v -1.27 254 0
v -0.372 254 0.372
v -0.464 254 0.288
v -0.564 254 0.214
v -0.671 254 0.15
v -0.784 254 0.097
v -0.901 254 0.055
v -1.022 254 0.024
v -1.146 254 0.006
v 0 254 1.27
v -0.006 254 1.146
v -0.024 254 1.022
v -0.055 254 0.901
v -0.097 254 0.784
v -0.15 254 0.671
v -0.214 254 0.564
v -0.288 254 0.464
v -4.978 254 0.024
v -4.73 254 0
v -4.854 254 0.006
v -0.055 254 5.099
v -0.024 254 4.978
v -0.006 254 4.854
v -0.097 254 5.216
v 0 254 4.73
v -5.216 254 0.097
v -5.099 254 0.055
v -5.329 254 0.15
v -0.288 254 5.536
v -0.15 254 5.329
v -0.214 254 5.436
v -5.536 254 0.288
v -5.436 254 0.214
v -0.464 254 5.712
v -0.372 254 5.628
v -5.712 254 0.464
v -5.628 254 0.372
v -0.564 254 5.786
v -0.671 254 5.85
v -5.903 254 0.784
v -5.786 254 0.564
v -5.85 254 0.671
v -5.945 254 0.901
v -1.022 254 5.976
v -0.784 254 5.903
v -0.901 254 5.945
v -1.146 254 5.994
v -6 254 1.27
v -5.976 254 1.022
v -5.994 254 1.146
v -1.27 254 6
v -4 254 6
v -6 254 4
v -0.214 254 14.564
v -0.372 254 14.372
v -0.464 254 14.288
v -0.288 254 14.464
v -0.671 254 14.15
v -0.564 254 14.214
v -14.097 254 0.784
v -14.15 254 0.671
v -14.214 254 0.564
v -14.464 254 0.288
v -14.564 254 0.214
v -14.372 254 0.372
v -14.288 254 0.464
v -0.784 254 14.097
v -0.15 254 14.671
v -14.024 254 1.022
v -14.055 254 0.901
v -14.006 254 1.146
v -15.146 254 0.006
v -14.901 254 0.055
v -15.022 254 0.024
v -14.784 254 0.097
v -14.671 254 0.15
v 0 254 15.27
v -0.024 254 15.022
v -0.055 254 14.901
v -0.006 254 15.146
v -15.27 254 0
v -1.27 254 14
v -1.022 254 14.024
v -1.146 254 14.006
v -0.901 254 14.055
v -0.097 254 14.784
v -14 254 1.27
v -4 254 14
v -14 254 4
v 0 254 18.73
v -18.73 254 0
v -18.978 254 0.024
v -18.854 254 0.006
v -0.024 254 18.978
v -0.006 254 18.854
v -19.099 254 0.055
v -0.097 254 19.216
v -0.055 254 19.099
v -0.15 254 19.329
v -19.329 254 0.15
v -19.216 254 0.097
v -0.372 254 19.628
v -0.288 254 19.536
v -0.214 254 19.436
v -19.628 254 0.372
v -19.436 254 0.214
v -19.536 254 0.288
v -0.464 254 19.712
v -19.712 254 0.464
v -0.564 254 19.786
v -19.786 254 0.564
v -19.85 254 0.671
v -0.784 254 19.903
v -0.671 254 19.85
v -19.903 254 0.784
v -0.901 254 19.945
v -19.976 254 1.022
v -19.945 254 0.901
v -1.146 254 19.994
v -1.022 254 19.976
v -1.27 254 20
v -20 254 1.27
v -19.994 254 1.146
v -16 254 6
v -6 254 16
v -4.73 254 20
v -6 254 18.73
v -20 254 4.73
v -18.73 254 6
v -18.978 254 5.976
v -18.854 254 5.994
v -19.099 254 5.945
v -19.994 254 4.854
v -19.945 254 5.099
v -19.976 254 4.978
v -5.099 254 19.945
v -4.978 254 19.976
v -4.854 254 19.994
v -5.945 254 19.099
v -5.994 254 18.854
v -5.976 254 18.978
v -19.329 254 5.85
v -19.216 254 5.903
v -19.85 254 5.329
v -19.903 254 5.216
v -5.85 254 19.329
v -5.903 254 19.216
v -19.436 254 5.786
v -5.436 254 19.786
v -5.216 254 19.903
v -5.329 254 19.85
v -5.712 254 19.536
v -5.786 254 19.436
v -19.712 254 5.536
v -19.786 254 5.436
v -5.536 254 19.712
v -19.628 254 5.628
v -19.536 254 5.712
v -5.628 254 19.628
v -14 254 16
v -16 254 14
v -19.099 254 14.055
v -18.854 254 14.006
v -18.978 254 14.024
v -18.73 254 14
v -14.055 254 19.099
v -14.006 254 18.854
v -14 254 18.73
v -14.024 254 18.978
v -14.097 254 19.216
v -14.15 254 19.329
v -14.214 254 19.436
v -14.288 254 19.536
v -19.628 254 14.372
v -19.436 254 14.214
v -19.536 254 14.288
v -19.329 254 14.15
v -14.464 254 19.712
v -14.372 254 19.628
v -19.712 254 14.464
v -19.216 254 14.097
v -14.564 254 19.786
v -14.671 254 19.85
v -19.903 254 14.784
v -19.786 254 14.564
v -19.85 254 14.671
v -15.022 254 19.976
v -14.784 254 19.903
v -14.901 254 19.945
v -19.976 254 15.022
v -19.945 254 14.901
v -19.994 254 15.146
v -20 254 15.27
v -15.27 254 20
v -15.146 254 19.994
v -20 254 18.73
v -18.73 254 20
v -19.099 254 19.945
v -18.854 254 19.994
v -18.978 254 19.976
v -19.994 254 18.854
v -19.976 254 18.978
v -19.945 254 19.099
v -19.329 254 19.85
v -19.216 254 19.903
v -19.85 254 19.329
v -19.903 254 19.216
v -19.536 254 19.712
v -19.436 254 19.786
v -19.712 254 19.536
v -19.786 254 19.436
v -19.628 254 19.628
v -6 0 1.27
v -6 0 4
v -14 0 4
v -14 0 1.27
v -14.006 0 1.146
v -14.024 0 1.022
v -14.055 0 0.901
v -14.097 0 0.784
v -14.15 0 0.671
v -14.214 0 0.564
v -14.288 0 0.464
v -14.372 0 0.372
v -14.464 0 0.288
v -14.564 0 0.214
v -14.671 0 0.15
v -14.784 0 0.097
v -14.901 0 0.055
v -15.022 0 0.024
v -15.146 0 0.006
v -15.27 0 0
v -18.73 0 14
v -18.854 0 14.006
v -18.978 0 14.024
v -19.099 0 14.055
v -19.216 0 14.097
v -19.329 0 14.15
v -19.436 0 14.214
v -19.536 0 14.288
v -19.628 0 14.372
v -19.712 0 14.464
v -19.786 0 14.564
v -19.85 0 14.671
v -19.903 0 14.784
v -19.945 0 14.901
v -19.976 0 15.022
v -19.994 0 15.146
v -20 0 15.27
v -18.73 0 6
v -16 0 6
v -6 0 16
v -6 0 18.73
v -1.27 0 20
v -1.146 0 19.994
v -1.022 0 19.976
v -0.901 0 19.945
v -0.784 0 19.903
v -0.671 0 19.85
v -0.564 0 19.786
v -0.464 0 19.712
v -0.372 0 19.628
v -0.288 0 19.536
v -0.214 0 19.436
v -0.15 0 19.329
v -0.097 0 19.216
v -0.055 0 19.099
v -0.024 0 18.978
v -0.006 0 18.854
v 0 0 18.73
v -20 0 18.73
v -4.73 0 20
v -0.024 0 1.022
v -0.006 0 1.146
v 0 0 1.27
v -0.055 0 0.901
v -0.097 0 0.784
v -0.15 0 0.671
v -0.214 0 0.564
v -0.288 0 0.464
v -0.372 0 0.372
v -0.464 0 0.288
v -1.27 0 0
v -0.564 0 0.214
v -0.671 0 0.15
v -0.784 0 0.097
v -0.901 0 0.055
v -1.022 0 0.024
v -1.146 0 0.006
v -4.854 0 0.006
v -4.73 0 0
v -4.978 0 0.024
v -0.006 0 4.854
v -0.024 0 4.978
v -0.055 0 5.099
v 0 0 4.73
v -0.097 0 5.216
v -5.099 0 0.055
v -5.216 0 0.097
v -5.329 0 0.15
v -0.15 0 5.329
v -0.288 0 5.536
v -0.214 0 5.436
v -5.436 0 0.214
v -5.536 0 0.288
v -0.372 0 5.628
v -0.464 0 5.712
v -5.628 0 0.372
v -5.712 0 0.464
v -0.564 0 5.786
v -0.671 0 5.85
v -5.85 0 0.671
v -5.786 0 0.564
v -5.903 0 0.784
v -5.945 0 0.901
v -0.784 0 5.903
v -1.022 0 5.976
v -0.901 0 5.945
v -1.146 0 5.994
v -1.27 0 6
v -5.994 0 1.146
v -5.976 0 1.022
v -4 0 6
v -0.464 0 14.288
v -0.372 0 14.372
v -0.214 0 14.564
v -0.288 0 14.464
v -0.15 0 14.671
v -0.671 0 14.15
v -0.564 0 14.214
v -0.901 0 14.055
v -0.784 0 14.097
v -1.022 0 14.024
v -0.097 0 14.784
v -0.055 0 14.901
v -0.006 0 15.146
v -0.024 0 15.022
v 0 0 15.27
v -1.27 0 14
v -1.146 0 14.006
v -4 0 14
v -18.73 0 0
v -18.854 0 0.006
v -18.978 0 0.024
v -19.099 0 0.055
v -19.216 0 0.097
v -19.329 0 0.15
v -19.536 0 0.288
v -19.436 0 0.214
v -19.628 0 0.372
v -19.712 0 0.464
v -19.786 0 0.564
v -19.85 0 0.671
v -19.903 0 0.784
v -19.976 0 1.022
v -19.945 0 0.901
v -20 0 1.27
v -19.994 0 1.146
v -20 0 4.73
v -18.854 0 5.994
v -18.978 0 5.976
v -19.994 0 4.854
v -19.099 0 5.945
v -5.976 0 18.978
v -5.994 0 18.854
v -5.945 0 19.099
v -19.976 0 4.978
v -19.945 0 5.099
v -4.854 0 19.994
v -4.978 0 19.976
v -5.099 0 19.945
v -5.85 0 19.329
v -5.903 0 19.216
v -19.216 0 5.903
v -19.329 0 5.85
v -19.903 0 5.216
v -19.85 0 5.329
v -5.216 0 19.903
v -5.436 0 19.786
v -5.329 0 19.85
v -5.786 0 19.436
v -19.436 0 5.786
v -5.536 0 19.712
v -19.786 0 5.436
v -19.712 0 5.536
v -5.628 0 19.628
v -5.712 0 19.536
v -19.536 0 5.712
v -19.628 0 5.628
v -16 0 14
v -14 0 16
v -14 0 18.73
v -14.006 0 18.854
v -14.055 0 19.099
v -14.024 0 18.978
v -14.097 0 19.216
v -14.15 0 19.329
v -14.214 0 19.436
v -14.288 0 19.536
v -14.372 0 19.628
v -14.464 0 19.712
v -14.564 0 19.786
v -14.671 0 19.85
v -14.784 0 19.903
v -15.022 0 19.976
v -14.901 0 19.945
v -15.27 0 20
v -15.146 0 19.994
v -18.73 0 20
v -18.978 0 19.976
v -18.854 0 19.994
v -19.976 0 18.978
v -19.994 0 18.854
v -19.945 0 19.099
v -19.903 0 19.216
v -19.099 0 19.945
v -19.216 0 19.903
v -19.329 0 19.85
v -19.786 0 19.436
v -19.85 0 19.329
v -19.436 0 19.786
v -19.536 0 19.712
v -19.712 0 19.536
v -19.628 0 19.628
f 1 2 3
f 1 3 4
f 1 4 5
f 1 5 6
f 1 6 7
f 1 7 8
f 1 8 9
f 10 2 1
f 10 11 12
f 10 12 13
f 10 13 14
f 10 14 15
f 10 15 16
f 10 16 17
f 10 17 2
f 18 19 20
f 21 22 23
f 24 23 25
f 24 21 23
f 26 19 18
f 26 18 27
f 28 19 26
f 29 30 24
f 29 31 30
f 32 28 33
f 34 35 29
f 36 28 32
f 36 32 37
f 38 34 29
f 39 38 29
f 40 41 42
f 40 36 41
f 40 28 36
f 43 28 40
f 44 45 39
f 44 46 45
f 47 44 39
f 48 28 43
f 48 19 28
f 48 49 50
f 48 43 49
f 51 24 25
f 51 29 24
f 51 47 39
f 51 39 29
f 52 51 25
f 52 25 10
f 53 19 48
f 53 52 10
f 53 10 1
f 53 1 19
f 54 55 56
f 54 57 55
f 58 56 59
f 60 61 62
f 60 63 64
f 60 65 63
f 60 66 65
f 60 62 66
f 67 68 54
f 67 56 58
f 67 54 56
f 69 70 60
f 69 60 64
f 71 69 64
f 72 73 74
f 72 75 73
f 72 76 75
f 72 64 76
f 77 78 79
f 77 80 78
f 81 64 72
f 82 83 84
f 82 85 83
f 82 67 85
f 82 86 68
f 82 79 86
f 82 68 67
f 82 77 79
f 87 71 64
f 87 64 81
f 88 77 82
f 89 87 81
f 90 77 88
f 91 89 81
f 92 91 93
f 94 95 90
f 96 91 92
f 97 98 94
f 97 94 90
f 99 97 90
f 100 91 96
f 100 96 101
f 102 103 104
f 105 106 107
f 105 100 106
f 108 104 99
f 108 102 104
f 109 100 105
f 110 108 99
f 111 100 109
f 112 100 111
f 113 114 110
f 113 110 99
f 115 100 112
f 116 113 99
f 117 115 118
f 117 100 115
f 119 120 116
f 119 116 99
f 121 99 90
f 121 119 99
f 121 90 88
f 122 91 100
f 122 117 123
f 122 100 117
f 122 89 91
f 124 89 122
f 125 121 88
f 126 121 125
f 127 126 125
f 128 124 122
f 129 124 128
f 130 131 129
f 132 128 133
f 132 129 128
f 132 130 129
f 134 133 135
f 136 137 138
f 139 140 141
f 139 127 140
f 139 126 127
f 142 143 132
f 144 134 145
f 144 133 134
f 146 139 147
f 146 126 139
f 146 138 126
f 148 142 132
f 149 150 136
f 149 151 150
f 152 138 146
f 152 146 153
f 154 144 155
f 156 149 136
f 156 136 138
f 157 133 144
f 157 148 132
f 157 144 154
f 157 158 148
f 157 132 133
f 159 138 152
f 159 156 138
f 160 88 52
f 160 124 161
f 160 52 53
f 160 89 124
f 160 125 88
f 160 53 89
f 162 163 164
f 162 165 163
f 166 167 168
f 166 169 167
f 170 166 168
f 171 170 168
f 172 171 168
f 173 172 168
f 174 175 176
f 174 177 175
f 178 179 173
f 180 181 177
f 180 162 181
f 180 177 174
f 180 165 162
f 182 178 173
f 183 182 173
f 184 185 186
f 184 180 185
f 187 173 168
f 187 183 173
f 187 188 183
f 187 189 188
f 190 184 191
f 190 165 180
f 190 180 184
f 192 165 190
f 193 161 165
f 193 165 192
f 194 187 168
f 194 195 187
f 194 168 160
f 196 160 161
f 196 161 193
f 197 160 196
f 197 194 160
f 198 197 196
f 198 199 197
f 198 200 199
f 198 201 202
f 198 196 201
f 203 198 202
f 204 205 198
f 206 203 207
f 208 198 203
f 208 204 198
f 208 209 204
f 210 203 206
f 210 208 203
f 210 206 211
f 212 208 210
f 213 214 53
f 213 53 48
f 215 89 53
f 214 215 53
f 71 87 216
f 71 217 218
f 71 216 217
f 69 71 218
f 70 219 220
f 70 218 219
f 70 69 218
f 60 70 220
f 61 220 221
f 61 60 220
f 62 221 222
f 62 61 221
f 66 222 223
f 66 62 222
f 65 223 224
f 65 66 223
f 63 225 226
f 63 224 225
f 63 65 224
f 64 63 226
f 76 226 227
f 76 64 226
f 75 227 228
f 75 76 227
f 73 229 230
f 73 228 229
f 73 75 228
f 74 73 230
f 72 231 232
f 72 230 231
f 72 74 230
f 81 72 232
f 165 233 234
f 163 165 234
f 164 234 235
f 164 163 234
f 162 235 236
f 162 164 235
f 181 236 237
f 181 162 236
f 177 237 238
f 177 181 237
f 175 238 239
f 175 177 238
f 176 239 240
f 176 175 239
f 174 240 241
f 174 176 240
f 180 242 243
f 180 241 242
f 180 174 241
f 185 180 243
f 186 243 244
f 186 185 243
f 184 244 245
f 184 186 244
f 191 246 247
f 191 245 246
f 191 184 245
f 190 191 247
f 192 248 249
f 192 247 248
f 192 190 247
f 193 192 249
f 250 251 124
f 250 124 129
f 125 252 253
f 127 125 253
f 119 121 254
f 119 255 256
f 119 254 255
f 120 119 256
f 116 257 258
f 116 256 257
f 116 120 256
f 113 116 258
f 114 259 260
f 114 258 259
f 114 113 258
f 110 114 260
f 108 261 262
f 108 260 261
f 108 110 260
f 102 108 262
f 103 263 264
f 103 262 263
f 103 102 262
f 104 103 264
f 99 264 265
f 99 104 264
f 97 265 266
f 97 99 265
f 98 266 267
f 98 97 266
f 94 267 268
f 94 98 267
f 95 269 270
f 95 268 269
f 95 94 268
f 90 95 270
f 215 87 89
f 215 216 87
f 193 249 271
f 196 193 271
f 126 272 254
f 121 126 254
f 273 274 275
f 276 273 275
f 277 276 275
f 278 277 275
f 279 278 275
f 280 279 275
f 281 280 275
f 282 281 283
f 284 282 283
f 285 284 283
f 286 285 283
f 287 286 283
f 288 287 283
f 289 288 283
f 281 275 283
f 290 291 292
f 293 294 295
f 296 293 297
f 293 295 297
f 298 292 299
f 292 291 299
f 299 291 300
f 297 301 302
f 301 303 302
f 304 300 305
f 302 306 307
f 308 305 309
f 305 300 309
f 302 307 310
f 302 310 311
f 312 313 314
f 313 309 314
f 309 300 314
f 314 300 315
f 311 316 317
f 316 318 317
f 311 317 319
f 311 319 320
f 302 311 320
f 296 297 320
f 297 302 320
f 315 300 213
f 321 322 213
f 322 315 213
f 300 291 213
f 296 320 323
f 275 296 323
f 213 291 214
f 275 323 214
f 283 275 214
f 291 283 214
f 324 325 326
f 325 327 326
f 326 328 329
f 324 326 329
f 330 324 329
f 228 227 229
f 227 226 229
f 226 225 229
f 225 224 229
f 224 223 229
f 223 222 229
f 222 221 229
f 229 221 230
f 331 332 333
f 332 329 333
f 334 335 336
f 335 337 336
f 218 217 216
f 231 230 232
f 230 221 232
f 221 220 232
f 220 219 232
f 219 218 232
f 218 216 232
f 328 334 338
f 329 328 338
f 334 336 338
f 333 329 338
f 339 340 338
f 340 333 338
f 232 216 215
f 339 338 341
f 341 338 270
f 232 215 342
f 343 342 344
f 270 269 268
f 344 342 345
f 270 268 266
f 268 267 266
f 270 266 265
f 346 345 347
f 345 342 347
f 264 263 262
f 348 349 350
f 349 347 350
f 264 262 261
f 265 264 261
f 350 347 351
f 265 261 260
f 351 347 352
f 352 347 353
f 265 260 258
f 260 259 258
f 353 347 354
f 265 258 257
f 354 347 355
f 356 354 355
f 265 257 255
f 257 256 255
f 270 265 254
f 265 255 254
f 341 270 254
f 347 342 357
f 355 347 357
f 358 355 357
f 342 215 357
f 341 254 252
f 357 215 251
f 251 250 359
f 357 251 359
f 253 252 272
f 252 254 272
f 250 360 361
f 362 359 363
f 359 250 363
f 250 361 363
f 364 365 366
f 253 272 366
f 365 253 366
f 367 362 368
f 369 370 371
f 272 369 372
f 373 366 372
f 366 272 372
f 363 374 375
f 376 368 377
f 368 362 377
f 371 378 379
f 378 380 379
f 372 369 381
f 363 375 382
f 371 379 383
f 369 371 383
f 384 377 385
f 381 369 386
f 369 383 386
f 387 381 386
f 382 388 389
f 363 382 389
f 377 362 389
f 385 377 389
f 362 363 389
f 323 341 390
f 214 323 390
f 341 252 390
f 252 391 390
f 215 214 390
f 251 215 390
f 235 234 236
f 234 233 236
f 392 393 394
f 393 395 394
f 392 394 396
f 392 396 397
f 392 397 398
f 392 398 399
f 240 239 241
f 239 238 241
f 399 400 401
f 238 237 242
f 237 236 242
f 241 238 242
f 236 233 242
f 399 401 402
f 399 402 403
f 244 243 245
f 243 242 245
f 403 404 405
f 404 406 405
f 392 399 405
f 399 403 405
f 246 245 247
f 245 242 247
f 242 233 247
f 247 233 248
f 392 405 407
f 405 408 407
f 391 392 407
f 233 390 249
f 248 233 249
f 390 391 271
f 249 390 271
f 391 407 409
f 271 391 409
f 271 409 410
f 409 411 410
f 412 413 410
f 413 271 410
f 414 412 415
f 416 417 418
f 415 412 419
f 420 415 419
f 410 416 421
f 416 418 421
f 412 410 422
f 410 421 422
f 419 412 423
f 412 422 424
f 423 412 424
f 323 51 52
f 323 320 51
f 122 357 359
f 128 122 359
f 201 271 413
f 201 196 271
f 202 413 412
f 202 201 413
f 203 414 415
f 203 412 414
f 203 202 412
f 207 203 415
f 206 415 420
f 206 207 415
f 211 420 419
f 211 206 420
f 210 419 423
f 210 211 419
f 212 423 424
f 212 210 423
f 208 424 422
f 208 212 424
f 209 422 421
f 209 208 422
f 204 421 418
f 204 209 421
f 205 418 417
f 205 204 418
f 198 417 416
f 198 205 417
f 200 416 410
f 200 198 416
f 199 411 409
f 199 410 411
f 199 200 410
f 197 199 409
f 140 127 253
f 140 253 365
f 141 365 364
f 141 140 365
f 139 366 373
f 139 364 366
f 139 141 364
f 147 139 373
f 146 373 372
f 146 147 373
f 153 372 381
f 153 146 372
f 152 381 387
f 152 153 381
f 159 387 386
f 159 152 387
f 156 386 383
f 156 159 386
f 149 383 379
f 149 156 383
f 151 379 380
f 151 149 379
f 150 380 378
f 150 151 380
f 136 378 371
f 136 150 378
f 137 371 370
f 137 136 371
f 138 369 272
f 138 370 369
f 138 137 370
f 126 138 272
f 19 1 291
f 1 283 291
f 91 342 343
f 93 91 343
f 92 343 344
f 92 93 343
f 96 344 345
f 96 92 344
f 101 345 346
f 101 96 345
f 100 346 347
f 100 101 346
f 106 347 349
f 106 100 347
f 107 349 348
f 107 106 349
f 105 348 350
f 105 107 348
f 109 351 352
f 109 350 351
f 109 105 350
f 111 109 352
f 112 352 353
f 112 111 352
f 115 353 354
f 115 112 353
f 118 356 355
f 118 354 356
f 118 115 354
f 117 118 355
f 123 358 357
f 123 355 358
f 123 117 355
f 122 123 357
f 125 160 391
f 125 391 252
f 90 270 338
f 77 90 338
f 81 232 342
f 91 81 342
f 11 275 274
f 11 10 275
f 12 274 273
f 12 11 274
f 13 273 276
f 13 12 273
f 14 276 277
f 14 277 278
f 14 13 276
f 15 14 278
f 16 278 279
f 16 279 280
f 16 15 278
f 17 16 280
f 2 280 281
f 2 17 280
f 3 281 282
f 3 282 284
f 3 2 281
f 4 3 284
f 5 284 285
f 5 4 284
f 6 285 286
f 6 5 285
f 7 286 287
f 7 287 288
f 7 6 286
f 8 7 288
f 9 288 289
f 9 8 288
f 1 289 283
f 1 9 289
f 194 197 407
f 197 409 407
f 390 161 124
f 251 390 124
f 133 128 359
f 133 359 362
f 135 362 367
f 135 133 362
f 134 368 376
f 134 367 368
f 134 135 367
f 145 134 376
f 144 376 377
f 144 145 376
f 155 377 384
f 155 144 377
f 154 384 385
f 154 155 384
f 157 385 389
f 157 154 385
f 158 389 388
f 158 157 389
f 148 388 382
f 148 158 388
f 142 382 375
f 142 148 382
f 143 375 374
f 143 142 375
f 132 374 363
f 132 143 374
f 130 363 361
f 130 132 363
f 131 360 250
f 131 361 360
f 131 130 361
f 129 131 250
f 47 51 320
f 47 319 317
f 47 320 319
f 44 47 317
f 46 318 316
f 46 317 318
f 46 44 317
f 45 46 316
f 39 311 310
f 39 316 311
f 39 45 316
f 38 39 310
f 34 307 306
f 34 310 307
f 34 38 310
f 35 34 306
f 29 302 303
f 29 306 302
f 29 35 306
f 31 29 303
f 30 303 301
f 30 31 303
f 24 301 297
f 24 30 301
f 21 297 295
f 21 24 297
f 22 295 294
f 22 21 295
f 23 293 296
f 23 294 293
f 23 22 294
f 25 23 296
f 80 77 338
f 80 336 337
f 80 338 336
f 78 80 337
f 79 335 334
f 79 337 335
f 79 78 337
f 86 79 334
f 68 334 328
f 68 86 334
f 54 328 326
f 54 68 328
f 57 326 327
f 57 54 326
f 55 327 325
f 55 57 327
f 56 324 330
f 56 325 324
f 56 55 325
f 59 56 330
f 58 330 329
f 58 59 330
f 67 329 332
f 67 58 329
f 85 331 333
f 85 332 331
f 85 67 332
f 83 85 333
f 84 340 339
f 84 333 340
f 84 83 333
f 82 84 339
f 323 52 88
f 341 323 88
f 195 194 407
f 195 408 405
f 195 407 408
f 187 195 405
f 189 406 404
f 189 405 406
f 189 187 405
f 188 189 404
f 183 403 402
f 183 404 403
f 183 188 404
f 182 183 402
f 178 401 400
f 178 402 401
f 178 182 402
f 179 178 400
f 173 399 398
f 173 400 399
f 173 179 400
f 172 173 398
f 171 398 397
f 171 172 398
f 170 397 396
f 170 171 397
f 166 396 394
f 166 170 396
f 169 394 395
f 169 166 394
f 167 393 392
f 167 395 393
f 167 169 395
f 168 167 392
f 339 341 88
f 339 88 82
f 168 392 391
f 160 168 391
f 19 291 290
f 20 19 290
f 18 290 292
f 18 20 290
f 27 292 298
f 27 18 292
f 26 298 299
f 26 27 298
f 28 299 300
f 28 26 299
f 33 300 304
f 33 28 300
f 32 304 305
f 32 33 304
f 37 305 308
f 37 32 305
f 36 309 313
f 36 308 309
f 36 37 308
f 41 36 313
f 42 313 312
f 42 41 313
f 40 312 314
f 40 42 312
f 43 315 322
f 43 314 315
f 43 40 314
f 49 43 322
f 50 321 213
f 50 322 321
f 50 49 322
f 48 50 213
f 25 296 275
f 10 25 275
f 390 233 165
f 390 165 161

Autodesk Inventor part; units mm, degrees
ref_plane "YZ Plane" through (0, 0, 0) normal (1, 0, 0) x (0, 1, 0)
ref_plane "XZ Plane" through (0, 0, 0) normal (0, 1, 0) x (-1, 0, 0)
sketch "Sketch1" plane through (0, 0, 0) normal (0, 1, 0) x (-1, 0, 0)
  line L0 (0, 0) -> (20, 0)
  line L1 (20, 0) -> (20, 20)
  line L2 (20, 20) -> (0, 20)
  line L3 (0, 20) -> (0, 0)
  line L4 (6, 0) -> (14, 0)
  line L5 (14, 0) -> (14, 4)
  line L6 (14, 4) -> (6, 4)
  line L7 (6, 4) -> (6, 0)
  line L8 (0, 6) -> (4, 6)
  line L9 (4, 6) -> (4, 14)
  line L10 (4, 14) -> (0, 14)
  line L11 (0, 14) -> (0, 6)
  line L12 (6, 20) -> (14, 20)
  line L13 (14, 20) -> (14, 16)
  line L14 (14, 16) -> (6, 16)
  line L15 (6, 16) -> (6, 20)
  line L16 (20, 14) -> (16, 14)
  line L17 (16, 14) -> (16, 6)
  line L18 (16, 6) -> (20, 6)
  line L19 (20, 6) -> (20, 14)
  dimension "d0" = 20
  dimension "d1" = 20
  dimension "d2" = 8
  dimension "d3" = 6
  dimension "d4" = 8
  dimension "d5" = 6
  dimension "d6" = 4
  dimension "d7" = 4
  dimension "d8" = 4
  dimension "d9" = 4
extrude "Extrusion1" add sketch "Sketch1" along normal blind 254 contours L3 L8 L9 L10 L2 L15 L14 L13 L1 L16 L17 L18 L0 L5 L6 L7
fillet "Fillet1" radius 1.27 12 edges at (0, 127, 20) (0, 127, 14) (-6, 127, 20) (-14, 127, 20) (-20, 127, 20) (-20, 127, 14) (0, 127, 6) (0, 127, 0) (-6, 127, 0) (-14, 127, 0) (-20, 127, 0) (-20, 127, 6)
ref_plane "Work Plane1" through (-4.73, 0, 10) normal (0, 0, 1) x (1, 0, 0)
properties part number "20x20extrusionshort" material "Aluminum 6061"
